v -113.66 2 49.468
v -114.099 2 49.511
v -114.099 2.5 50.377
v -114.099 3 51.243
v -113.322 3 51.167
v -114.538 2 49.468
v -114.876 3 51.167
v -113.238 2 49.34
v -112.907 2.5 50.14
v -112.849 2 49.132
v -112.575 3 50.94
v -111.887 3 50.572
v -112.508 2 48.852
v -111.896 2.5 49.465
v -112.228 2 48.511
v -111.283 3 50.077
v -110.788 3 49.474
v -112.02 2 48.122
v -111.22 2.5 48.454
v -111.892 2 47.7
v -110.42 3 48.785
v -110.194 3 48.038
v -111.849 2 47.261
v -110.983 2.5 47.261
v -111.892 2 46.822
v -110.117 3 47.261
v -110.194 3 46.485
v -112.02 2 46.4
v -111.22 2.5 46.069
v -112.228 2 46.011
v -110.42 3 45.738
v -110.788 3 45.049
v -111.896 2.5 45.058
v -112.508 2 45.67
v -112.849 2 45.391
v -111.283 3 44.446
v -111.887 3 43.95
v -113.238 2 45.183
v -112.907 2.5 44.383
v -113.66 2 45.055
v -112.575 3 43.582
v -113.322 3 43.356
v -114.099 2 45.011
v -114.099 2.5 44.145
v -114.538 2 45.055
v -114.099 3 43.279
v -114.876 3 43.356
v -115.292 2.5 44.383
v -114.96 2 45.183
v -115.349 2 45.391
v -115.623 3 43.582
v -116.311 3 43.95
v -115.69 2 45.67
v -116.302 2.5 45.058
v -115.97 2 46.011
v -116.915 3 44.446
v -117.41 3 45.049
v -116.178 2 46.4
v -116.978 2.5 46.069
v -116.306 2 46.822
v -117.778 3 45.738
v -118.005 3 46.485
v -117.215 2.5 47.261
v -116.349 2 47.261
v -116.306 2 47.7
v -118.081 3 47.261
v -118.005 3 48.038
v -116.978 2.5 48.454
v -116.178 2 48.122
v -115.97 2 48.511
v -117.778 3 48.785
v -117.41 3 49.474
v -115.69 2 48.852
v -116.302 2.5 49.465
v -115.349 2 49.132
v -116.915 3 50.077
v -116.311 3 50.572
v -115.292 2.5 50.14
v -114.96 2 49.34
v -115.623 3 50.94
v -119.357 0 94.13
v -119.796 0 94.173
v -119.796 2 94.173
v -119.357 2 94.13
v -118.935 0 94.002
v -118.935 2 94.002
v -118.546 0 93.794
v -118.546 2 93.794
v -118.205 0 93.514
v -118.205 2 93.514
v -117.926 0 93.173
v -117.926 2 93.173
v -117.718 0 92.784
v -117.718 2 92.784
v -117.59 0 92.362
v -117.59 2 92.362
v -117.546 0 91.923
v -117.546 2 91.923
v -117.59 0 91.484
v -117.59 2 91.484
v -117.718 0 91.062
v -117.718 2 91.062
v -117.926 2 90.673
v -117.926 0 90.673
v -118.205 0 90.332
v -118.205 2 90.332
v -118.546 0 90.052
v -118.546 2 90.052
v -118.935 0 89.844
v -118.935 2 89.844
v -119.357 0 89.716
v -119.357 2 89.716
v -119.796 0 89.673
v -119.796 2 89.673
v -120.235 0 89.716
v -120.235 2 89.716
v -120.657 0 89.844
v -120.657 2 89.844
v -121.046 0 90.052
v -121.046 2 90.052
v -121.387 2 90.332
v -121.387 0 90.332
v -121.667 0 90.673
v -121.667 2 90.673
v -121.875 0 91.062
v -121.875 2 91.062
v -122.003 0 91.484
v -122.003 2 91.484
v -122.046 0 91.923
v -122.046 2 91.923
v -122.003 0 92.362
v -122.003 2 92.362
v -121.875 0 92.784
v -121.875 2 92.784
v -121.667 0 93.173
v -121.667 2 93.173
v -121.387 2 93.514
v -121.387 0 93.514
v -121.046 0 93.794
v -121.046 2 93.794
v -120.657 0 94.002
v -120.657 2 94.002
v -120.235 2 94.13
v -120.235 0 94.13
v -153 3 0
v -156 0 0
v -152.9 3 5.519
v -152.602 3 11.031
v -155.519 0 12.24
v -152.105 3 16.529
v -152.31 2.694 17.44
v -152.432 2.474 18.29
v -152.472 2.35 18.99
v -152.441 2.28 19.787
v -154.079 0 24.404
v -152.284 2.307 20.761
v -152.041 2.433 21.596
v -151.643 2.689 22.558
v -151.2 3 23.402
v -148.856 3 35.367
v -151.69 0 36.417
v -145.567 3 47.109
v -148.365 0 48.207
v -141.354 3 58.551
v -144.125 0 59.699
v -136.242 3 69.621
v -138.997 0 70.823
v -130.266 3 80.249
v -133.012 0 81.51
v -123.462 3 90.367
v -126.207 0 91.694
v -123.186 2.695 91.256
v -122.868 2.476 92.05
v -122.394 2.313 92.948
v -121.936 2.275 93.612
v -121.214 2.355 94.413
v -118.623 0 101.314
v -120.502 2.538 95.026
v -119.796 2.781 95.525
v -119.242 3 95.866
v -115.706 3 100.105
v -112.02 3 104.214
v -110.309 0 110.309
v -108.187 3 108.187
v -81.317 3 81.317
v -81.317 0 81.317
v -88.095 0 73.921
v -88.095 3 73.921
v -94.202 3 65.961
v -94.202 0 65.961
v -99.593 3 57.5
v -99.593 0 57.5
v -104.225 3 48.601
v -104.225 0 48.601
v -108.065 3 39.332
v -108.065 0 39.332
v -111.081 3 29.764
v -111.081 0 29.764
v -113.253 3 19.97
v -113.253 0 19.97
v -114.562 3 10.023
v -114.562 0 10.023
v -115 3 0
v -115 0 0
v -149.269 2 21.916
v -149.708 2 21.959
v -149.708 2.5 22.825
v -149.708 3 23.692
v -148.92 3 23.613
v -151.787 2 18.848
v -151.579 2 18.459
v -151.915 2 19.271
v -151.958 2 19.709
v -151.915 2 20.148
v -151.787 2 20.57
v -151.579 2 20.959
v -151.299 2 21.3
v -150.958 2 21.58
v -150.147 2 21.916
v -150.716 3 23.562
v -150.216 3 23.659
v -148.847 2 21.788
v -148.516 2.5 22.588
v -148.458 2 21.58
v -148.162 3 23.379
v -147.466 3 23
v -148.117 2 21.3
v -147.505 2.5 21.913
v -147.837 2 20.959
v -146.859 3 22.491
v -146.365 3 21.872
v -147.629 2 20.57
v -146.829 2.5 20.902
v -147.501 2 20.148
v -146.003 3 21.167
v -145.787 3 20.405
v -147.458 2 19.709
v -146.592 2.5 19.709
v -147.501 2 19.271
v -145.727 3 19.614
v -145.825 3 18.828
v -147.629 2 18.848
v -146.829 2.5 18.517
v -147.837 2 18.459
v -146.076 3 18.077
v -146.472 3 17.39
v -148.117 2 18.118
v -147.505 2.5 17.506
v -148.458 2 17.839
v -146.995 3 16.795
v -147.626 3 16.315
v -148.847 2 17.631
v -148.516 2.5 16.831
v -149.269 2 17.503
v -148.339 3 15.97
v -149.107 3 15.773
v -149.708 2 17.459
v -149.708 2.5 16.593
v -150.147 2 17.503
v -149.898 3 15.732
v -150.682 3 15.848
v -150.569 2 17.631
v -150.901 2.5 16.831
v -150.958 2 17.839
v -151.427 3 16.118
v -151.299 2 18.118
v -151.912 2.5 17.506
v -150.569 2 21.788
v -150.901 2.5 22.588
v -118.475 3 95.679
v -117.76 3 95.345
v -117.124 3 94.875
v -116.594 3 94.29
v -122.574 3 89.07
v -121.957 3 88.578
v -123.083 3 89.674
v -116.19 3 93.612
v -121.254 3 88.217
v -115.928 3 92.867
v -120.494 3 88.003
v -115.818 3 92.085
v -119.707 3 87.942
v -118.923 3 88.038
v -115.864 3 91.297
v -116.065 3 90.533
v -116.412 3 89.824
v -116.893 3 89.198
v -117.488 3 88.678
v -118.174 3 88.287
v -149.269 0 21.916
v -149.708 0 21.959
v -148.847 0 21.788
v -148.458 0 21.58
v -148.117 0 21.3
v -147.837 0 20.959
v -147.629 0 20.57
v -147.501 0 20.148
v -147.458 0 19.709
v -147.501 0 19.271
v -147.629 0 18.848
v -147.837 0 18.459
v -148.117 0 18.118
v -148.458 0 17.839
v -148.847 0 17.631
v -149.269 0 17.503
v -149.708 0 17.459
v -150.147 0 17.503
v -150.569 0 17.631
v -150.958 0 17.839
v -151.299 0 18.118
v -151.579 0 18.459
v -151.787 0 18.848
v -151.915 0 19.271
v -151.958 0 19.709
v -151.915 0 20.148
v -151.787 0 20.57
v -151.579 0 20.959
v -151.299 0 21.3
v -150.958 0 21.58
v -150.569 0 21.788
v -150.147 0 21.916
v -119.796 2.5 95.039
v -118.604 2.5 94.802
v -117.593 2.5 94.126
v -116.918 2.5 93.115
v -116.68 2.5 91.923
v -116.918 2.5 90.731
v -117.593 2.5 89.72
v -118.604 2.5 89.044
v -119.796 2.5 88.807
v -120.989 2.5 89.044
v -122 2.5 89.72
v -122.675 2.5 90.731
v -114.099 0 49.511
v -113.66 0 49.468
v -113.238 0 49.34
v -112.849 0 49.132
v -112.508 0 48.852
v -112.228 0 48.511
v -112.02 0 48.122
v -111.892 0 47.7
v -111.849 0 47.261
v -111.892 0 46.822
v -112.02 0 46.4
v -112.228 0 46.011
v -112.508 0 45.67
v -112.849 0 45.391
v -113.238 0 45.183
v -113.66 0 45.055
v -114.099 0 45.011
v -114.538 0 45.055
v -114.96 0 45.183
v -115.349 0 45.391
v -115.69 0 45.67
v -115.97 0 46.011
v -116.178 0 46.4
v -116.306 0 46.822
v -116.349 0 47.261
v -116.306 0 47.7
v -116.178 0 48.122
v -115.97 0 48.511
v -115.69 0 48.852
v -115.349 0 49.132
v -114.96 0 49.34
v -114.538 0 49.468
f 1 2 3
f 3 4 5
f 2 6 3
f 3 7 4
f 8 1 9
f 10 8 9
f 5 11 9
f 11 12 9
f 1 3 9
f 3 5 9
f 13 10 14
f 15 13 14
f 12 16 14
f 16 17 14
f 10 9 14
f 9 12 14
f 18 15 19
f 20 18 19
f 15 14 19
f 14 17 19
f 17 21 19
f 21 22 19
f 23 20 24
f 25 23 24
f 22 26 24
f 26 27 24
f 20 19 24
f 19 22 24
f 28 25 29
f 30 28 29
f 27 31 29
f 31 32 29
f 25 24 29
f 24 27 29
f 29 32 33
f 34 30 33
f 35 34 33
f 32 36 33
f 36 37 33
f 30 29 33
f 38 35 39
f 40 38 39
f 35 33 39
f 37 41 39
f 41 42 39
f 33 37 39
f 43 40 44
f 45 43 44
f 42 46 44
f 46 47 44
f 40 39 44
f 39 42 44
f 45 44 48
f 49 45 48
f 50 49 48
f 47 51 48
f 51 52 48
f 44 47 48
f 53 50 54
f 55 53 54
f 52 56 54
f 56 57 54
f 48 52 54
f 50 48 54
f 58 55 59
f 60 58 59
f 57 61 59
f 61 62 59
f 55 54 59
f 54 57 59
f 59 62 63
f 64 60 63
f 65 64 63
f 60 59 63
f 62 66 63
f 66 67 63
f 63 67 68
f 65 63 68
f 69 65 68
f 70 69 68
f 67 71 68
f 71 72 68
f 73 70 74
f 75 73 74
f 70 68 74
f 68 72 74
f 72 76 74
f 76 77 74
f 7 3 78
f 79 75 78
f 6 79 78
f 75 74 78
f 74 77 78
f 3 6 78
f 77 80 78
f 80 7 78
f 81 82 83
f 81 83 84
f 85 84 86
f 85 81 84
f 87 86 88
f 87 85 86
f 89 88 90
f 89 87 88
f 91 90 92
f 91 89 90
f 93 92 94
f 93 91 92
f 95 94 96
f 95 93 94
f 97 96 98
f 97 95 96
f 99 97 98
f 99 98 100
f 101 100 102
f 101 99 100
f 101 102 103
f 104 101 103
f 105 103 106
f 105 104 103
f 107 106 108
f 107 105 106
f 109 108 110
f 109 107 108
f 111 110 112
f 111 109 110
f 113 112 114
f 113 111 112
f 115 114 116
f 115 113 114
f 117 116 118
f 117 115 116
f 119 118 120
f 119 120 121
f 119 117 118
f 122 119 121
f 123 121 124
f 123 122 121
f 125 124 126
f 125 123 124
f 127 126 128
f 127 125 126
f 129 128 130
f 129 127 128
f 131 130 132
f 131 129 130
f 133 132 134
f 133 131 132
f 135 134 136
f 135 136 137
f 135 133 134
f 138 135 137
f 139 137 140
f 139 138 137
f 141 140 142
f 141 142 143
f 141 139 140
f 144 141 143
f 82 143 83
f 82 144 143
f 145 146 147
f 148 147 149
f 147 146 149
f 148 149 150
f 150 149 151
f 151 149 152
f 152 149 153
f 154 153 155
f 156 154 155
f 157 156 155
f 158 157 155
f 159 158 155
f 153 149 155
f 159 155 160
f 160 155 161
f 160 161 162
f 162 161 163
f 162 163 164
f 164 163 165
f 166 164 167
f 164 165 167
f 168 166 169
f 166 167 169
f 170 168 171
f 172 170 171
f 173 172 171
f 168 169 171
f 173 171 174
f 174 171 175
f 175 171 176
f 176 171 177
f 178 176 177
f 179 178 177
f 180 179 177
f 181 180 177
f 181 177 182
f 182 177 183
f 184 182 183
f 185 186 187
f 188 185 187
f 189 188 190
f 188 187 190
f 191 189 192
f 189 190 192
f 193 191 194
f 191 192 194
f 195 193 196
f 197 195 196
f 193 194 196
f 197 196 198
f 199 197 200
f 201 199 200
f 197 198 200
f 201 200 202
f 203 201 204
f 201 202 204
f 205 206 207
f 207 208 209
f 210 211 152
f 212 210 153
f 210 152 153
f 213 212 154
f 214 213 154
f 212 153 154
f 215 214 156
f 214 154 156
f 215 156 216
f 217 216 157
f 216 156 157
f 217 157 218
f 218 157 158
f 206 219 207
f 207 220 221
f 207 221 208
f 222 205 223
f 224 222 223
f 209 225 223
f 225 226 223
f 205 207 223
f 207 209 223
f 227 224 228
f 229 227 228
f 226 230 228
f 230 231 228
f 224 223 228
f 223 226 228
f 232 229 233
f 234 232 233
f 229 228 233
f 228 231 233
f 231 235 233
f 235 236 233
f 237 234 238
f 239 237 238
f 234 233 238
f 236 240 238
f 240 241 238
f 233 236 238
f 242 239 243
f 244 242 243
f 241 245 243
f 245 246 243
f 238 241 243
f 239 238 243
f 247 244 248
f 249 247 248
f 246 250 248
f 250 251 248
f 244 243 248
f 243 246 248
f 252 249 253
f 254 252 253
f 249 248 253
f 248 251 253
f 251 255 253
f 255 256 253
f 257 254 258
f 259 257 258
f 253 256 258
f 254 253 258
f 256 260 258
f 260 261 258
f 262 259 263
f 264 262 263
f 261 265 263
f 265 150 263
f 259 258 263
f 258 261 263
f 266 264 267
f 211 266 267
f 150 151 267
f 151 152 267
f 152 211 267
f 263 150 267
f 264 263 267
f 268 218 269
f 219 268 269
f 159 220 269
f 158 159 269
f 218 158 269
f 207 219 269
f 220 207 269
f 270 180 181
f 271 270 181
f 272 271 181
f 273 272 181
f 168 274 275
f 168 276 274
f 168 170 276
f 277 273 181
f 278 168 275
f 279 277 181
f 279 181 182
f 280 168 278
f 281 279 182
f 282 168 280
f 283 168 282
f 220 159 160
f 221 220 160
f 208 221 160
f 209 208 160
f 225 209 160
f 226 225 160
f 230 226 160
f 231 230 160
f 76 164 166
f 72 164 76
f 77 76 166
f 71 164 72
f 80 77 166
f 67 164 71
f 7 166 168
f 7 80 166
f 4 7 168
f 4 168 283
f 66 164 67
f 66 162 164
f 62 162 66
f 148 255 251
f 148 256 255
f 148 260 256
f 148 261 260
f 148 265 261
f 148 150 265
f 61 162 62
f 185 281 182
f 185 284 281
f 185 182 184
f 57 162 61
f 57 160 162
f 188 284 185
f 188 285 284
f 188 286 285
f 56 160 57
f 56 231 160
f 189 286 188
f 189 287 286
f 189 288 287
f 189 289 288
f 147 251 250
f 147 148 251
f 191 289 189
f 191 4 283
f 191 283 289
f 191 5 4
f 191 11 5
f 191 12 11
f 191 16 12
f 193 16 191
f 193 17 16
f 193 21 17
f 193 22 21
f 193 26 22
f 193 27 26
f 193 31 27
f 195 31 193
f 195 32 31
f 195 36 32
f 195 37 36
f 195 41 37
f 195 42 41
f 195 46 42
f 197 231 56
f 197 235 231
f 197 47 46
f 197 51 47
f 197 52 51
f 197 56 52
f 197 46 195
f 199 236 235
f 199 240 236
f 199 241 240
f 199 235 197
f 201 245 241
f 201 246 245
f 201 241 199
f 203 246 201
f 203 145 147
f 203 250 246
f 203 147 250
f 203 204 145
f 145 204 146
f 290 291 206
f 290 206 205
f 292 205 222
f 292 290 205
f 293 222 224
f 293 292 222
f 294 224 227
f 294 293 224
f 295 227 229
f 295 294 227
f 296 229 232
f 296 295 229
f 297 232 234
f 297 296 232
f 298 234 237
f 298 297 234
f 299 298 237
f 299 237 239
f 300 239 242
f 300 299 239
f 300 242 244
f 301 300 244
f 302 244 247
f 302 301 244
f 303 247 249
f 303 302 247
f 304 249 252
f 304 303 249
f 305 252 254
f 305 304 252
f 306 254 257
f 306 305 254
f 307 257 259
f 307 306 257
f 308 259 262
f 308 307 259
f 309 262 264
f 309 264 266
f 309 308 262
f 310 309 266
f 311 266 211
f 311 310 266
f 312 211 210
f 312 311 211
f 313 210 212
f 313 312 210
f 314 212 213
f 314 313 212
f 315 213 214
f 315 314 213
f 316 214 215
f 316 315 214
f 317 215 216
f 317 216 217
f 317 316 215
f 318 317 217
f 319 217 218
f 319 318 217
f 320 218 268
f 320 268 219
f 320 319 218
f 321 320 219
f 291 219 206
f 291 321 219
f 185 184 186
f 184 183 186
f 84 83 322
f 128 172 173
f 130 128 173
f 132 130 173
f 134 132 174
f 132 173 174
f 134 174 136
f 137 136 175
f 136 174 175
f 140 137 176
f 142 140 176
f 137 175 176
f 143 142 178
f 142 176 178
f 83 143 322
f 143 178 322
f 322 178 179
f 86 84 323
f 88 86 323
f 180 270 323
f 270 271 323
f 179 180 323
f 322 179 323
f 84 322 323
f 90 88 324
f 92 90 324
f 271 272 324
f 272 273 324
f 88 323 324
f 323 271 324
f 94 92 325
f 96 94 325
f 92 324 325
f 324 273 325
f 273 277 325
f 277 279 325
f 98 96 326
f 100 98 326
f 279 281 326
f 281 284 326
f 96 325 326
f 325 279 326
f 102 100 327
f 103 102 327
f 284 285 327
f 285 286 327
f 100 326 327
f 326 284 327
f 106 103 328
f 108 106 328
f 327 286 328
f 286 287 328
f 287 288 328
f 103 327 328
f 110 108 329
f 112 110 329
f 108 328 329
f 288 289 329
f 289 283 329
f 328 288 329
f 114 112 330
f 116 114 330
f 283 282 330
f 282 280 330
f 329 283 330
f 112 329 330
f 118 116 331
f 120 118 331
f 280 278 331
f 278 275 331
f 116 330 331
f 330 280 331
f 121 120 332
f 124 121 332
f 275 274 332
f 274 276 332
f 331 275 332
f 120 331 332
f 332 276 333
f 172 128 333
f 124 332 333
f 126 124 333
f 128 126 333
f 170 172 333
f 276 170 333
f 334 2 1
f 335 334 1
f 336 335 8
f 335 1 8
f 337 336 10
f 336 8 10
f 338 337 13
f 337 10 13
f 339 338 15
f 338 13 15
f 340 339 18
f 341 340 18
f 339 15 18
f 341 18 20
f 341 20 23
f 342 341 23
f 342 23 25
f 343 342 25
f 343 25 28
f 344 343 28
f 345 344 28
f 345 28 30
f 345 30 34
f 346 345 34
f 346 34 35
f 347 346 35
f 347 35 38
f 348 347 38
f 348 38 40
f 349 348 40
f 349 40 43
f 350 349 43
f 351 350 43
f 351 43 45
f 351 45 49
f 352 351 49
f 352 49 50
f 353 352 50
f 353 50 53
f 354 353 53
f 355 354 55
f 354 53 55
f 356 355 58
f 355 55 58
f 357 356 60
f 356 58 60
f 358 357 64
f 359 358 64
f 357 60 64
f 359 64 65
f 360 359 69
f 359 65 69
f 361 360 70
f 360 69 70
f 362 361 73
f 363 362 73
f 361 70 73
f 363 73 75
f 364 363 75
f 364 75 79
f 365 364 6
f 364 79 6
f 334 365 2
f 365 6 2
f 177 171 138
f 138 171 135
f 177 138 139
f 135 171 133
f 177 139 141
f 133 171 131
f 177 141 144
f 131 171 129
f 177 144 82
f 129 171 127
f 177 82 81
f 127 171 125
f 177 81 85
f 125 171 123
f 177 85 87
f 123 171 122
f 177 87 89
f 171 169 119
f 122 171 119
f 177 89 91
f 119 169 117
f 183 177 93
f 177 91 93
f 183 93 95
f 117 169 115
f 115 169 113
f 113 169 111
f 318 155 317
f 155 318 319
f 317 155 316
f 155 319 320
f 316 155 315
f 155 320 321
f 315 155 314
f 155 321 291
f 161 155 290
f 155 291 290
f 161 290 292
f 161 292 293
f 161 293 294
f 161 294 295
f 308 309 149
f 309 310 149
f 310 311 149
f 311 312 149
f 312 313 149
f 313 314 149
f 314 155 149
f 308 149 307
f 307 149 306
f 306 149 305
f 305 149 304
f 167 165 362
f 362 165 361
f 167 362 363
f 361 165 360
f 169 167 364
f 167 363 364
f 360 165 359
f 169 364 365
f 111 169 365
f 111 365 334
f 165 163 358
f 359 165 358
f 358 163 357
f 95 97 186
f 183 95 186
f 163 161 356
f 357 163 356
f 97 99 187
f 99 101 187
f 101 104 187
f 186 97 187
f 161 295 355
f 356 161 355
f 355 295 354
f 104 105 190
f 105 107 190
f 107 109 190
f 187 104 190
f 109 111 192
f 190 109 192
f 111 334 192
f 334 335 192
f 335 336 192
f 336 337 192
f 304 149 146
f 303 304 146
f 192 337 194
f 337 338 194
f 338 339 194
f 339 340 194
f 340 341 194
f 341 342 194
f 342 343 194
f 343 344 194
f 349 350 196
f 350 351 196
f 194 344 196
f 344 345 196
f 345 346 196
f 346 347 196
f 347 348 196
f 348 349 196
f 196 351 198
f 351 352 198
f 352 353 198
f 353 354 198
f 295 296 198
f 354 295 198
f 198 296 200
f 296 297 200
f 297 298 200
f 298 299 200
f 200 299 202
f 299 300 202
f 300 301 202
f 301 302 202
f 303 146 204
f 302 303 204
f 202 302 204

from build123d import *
from OCP.BRepFilletAPI import BRepFilletAPI_MakeChamfer

# Parameters (mm, degrees)
SKETCH1_R           = 2.25
BOSS_EXTRUDE1_DEPTH = 3
CHAMFER2_SIZE       = 1
CHAMFER2_SIZE2      = 1.732050808
SKETCH2_R           = 2.25
CUT_EXTRUDE1_DEPTH  = 192.083751272
CHAMFER1_SIZE       = 3
CHAMFER3_SIZE       = 1
CHAMFER3_SIZE2      = 1.732050808


with BuildPart() as part:
    # Sketch1 → Boss-Extrude1 (new body)
    with BuildSketch(Plane(origin=(0, 0, 0), x_dir=(1, 0, 0), z_dir=(0, 1, 0))):
        with BuildLine():
            Line((-115, 0), (-156, 0))
            ThreePointArc((-156, 0), (-144.125207072, -59.698615449), (-110.308657865, -110.308657865))
            Line((-110.308657865, -110.308657865), (-81.317279836, -81.317279836))
            ThreePointArc((-81.317279836, -81.317279836), (-106.246146239, -44.008594722), (-115, 0))
        make_face()
        with Locations(Location((-149.708174067, -19.709455025, 0), (0, 0, 270))):
            Circle(SKETCH1_R, mode=Mode.SUBTRACT)
        with Locations(Location((-119.796354384, -91.92297578, 0), (0, 0, 270))):
            Circle(SKETCH1_R, mode=Mode.SUBTRACT)
    extrude(amount=BOSS_EXTRUDE1_DEPTH)

    # Chamfer2: one chamfer whose edges measure the first distance from different faces: ONE call of the kernel's chamfer builder (chamfer() names one face for all edges)
    chamfer2_edges_1 = [part.edges().sort_by_distance(p)[0] for p in [
        (-149.708174067, 3, 17.459455025),
    ]]
    chamfer2_side_1 = [part.faces().sort_by_distance(p)[0] for p in [
        (-149.708174067, 1.5, 17.459455025),
    ]]
    chamfer2_edges_2 = [part.edges().sort_by_distance(p)[0] for p in [
        (-119.796354384, 3, 89.67297578),
    ]]
    chamfer2_side_2 = [part.faces().sort_by_distance(p)[0] for p in [
        (-119.796354384, 1.5, 89.67297578),
    ]]
    chamfer2 = BRepFilletAPI_MakeChamfer(part.part.solid().wrapped)
    for e in chamfer2_edges_1:
        chamfer2.Add(CHAMFER2_SIZE, CHAMFER2_SIZE2, e.wrapped, chamfer2_side_1[0].wrapped)  # the first distance lies on this face
    for e in chamfer2_edges_2:
        chamfer2.Add(CHAMFER2_SIZE, CHAMFER2_SIZE2, e.wrapped, chamfer2_side_2[0].wrapped)  # the first distance lies on this face
    add(Compound.cast(chamfer2.Shape()), mode=Mode.REPLACE)

    # Sketch2 → Cut-Extrude1 (cut, through all)
    with BuildSketch(Plane(origin=(0, 3, 0), x_dir=(1, 0, 0), z_dir=(0, 1, 0))):
        with Locations(Location((-114.099122265, -47.261403897, 0), (0, 0, 270))):
            Circle(SKETCH2_R)
    extrude(amount=-CUT_EXTRUDE1_DEPTH, mode=Mode.SUBTRACT)

    # Chamfer1
    # the kernel refuses this chamfer: 3 mm, written as the material it takes off along each edge
    with BuildSketch(Plane(origin=(0, 3, 0), x_dir=(-0.9987770833709343, 0, -0.04944024406341062), z_dir=(0.04944024406341062, 0, -0.9987770833709343))) as chamfer1_piece_1:
        Polygon((156 - CHAMFER1_SIZE, 0), (156, -CHAMFER1_SIZE), (156, 0), align=None)
    revolve(axis=Axis((0, 3, 0), (0, 1, 0)), revolution_arc=50.667745228, mode=Mode.SUBTRACT)

    # Chamfer3
    chamfer3_edges = [part.edges().sort_by_distance(p)[0] for p in [
        (-114.099122265, 3, 45.011403897),
    ]]
    chamfer3_side = [part.faces().sort_by_distance(p)[0] for p in [
        (-114.099122265, 1.5, 45.011403897),
    ]]
    chamfer(chamfer3_edges, length=CHAMFER3_SIZE, length2=CHAMFER3_SIZE2, reference=chamfer3_side[0])


solid = part.part
